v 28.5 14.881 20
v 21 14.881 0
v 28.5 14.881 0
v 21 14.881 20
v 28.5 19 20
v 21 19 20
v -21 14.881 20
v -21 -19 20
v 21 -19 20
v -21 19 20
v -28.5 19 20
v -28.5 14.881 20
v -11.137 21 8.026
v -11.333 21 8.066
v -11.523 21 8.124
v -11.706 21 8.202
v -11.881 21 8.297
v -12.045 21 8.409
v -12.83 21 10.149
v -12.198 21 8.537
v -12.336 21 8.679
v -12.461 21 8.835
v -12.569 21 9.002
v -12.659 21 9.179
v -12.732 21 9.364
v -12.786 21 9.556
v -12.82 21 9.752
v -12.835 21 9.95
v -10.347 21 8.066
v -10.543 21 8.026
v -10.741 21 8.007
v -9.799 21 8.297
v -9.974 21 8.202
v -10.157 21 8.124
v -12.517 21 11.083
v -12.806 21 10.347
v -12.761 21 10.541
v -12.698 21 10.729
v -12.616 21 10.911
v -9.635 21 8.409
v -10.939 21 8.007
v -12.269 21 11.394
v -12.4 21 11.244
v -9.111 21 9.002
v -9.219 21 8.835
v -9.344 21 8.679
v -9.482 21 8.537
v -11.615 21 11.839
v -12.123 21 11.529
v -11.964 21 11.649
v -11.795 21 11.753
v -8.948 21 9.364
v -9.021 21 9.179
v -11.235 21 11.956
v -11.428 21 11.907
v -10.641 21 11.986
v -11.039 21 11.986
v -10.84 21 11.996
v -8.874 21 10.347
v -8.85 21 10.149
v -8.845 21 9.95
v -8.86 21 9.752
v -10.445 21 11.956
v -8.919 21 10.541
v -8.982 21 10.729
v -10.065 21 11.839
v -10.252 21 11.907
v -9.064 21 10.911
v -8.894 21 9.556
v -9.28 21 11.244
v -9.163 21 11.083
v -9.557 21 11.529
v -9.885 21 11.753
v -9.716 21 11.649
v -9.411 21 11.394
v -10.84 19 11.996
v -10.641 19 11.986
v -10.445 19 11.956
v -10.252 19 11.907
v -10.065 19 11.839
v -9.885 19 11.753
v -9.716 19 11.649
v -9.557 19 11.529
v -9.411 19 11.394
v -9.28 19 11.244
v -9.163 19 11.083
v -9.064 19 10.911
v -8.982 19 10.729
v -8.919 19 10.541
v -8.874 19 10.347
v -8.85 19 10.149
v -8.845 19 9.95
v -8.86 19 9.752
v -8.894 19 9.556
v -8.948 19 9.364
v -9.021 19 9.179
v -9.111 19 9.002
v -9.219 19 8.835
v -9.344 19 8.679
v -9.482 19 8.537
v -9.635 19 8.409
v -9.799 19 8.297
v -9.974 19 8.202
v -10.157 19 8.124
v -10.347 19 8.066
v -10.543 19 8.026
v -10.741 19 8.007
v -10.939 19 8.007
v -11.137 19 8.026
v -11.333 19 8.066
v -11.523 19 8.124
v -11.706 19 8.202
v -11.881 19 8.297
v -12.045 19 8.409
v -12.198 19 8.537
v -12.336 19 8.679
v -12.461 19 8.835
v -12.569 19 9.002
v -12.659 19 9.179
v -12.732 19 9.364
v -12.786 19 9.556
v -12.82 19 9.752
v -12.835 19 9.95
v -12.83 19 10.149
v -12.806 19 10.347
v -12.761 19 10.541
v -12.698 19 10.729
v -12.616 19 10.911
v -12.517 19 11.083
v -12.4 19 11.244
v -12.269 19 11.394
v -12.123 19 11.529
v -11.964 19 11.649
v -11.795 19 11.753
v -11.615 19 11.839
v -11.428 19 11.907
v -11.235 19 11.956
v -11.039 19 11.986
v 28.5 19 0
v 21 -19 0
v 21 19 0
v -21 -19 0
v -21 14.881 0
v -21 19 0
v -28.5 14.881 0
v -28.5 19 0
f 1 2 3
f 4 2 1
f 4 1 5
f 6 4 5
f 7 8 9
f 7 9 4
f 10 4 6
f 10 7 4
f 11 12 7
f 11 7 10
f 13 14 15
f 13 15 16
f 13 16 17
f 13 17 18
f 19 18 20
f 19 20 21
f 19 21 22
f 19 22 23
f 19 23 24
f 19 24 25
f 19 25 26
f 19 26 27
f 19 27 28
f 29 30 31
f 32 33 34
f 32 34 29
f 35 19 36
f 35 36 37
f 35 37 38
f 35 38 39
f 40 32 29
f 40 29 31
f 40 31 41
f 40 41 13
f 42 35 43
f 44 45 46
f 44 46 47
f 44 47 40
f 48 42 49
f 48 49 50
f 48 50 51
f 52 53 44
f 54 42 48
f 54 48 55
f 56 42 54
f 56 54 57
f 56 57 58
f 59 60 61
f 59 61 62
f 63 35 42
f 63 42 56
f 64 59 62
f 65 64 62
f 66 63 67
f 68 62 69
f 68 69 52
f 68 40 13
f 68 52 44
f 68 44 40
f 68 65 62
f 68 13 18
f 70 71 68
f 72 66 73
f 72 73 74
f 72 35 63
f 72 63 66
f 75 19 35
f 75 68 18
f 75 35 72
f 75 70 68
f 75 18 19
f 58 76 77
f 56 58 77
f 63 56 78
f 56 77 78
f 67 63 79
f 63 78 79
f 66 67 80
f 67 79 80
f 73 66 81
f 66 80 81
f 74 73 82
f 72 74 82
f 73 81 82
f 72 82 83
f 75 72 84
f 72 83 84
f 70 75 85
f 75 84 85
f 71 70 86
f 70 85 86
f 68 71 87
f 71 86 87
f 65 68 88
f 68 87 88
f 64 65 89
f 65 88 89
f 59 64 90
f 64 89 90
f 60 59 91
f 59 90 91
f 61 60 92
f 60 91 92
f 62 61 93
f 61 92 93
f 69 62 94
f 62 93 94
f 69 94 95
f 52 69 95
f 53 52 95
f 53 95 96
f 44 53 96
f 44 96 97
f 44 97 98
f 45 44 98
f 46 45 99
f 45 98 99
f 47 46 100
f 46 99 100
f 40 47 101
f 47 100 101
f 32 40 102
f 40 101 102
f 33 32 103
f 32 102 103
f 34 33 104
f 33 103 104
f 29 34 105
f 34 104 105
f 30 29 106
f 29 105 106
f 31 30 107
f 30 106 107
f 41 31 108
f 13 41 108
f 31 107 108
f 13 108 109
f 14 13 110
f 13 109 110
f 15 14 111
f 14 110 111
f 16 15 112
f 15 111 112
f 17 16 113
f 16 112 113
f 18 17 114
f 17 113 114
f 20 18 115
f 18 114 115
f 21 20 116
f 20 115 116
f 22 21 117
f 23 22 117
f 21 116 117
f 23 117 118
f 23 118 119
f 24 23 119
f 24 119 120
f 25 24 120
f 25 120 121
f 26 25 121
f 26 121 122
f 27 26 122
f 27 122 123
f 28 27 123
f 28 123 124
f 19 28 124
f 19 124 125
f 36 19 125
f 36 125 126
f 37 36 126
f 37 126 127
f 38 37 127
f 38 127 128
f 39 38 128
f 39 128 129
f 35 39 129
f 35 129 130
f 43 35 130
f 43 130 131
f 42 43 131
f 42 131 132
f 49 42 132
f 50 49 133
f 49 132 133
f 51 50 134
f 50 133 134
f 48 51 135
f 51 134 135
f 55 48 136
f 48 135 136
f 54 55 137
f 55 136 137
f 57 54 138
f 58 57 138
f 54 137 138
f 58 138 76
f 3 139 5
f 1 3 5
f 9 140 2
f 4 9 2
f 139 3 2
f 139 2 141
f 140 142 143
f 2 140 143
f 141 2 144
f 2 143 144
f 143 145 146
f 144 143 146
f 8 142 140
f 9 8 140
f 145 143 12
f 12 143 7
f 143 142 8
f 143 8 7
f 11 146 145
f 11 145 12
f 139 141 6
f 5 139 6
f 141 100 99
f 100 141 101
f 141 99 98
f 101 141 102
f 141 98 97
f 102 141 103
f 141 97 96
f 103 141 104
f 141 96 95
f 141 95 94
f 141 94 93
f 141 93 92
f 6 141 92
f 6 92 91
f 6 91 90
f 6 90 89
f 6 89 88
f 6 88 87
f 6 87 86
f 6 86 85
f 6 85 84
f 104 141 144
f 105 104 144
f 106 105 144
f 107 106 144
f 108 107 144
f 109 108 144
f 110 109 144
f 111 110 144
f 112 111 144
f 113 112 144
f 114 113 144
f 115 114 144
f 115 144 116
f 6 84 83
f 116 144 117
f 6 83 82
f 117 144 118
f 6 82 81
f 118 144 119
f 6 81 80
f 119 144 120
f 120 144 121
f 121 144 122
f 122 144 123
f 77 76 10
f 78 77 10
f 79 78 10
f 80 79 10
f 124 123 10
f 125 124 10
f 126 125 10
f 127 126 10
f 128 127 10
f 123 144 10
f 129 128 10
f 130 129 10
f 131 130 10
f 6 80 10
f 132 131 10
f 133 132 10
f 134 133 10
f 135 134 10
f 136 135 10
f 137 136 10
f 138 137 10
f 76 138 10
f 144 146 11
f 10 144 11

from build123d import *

# Parameters (mm, degrees)
SKETCH1_W           = 42
SKETCH1_H           = 38
BOSS_EXTRUDE1_DEPTH = 20
SKETCH3_R           = 1.995914713
BOSS_EXTRUDE2_DEPTH = 2
SKETCH4_W           = 20
SKETCH4_H           = 4.118584071
BOSS_EXTRUDE3_DEPTH = 7.5


with BuildPart() as part:
    # Sketch1 → Boss-Extrude1 (new body)
    with BuildSketch(Plane.XY):
        Rectangle(SKETCH1_W, SKETCH1_H)
    extrude(amount=BOSS_EXTRUDE1_DEPTH)

    # Sketch3 → Boss-Extrude2 (add)
    with BuildSketch(Plane(origin=(0, 19, 0), x_dir=(1, 0, 0), z_dir=(0, 1, 0))):
        with Locations(Location((-10.84, -10, 0), (0, 0, 270))):
            Circle(SKETCH3_R)
    extrude(amount=BOSS_EXTRUDE2_DEPTH)

    # Sketch4 → Boss-Extrude3 (add)
    with BuildSketch(Plane.ZY.offset(21)):
        with Locations((10, 16.940707964)):
            Rectangle(SKETCH4_W, SKETCH4_H)
    boss_extrude3 = extrude(amount=BOSS_EXTRUDE3_DEPTH)

    # Mirror2: Boss-Extrude3 across plane
    add(boss_extrude3.mirror(Plane(origin=(0, 0, 0), x_dir=(0, 0, 1), z_dir=(1, 0, 0))))


solid = part.part
